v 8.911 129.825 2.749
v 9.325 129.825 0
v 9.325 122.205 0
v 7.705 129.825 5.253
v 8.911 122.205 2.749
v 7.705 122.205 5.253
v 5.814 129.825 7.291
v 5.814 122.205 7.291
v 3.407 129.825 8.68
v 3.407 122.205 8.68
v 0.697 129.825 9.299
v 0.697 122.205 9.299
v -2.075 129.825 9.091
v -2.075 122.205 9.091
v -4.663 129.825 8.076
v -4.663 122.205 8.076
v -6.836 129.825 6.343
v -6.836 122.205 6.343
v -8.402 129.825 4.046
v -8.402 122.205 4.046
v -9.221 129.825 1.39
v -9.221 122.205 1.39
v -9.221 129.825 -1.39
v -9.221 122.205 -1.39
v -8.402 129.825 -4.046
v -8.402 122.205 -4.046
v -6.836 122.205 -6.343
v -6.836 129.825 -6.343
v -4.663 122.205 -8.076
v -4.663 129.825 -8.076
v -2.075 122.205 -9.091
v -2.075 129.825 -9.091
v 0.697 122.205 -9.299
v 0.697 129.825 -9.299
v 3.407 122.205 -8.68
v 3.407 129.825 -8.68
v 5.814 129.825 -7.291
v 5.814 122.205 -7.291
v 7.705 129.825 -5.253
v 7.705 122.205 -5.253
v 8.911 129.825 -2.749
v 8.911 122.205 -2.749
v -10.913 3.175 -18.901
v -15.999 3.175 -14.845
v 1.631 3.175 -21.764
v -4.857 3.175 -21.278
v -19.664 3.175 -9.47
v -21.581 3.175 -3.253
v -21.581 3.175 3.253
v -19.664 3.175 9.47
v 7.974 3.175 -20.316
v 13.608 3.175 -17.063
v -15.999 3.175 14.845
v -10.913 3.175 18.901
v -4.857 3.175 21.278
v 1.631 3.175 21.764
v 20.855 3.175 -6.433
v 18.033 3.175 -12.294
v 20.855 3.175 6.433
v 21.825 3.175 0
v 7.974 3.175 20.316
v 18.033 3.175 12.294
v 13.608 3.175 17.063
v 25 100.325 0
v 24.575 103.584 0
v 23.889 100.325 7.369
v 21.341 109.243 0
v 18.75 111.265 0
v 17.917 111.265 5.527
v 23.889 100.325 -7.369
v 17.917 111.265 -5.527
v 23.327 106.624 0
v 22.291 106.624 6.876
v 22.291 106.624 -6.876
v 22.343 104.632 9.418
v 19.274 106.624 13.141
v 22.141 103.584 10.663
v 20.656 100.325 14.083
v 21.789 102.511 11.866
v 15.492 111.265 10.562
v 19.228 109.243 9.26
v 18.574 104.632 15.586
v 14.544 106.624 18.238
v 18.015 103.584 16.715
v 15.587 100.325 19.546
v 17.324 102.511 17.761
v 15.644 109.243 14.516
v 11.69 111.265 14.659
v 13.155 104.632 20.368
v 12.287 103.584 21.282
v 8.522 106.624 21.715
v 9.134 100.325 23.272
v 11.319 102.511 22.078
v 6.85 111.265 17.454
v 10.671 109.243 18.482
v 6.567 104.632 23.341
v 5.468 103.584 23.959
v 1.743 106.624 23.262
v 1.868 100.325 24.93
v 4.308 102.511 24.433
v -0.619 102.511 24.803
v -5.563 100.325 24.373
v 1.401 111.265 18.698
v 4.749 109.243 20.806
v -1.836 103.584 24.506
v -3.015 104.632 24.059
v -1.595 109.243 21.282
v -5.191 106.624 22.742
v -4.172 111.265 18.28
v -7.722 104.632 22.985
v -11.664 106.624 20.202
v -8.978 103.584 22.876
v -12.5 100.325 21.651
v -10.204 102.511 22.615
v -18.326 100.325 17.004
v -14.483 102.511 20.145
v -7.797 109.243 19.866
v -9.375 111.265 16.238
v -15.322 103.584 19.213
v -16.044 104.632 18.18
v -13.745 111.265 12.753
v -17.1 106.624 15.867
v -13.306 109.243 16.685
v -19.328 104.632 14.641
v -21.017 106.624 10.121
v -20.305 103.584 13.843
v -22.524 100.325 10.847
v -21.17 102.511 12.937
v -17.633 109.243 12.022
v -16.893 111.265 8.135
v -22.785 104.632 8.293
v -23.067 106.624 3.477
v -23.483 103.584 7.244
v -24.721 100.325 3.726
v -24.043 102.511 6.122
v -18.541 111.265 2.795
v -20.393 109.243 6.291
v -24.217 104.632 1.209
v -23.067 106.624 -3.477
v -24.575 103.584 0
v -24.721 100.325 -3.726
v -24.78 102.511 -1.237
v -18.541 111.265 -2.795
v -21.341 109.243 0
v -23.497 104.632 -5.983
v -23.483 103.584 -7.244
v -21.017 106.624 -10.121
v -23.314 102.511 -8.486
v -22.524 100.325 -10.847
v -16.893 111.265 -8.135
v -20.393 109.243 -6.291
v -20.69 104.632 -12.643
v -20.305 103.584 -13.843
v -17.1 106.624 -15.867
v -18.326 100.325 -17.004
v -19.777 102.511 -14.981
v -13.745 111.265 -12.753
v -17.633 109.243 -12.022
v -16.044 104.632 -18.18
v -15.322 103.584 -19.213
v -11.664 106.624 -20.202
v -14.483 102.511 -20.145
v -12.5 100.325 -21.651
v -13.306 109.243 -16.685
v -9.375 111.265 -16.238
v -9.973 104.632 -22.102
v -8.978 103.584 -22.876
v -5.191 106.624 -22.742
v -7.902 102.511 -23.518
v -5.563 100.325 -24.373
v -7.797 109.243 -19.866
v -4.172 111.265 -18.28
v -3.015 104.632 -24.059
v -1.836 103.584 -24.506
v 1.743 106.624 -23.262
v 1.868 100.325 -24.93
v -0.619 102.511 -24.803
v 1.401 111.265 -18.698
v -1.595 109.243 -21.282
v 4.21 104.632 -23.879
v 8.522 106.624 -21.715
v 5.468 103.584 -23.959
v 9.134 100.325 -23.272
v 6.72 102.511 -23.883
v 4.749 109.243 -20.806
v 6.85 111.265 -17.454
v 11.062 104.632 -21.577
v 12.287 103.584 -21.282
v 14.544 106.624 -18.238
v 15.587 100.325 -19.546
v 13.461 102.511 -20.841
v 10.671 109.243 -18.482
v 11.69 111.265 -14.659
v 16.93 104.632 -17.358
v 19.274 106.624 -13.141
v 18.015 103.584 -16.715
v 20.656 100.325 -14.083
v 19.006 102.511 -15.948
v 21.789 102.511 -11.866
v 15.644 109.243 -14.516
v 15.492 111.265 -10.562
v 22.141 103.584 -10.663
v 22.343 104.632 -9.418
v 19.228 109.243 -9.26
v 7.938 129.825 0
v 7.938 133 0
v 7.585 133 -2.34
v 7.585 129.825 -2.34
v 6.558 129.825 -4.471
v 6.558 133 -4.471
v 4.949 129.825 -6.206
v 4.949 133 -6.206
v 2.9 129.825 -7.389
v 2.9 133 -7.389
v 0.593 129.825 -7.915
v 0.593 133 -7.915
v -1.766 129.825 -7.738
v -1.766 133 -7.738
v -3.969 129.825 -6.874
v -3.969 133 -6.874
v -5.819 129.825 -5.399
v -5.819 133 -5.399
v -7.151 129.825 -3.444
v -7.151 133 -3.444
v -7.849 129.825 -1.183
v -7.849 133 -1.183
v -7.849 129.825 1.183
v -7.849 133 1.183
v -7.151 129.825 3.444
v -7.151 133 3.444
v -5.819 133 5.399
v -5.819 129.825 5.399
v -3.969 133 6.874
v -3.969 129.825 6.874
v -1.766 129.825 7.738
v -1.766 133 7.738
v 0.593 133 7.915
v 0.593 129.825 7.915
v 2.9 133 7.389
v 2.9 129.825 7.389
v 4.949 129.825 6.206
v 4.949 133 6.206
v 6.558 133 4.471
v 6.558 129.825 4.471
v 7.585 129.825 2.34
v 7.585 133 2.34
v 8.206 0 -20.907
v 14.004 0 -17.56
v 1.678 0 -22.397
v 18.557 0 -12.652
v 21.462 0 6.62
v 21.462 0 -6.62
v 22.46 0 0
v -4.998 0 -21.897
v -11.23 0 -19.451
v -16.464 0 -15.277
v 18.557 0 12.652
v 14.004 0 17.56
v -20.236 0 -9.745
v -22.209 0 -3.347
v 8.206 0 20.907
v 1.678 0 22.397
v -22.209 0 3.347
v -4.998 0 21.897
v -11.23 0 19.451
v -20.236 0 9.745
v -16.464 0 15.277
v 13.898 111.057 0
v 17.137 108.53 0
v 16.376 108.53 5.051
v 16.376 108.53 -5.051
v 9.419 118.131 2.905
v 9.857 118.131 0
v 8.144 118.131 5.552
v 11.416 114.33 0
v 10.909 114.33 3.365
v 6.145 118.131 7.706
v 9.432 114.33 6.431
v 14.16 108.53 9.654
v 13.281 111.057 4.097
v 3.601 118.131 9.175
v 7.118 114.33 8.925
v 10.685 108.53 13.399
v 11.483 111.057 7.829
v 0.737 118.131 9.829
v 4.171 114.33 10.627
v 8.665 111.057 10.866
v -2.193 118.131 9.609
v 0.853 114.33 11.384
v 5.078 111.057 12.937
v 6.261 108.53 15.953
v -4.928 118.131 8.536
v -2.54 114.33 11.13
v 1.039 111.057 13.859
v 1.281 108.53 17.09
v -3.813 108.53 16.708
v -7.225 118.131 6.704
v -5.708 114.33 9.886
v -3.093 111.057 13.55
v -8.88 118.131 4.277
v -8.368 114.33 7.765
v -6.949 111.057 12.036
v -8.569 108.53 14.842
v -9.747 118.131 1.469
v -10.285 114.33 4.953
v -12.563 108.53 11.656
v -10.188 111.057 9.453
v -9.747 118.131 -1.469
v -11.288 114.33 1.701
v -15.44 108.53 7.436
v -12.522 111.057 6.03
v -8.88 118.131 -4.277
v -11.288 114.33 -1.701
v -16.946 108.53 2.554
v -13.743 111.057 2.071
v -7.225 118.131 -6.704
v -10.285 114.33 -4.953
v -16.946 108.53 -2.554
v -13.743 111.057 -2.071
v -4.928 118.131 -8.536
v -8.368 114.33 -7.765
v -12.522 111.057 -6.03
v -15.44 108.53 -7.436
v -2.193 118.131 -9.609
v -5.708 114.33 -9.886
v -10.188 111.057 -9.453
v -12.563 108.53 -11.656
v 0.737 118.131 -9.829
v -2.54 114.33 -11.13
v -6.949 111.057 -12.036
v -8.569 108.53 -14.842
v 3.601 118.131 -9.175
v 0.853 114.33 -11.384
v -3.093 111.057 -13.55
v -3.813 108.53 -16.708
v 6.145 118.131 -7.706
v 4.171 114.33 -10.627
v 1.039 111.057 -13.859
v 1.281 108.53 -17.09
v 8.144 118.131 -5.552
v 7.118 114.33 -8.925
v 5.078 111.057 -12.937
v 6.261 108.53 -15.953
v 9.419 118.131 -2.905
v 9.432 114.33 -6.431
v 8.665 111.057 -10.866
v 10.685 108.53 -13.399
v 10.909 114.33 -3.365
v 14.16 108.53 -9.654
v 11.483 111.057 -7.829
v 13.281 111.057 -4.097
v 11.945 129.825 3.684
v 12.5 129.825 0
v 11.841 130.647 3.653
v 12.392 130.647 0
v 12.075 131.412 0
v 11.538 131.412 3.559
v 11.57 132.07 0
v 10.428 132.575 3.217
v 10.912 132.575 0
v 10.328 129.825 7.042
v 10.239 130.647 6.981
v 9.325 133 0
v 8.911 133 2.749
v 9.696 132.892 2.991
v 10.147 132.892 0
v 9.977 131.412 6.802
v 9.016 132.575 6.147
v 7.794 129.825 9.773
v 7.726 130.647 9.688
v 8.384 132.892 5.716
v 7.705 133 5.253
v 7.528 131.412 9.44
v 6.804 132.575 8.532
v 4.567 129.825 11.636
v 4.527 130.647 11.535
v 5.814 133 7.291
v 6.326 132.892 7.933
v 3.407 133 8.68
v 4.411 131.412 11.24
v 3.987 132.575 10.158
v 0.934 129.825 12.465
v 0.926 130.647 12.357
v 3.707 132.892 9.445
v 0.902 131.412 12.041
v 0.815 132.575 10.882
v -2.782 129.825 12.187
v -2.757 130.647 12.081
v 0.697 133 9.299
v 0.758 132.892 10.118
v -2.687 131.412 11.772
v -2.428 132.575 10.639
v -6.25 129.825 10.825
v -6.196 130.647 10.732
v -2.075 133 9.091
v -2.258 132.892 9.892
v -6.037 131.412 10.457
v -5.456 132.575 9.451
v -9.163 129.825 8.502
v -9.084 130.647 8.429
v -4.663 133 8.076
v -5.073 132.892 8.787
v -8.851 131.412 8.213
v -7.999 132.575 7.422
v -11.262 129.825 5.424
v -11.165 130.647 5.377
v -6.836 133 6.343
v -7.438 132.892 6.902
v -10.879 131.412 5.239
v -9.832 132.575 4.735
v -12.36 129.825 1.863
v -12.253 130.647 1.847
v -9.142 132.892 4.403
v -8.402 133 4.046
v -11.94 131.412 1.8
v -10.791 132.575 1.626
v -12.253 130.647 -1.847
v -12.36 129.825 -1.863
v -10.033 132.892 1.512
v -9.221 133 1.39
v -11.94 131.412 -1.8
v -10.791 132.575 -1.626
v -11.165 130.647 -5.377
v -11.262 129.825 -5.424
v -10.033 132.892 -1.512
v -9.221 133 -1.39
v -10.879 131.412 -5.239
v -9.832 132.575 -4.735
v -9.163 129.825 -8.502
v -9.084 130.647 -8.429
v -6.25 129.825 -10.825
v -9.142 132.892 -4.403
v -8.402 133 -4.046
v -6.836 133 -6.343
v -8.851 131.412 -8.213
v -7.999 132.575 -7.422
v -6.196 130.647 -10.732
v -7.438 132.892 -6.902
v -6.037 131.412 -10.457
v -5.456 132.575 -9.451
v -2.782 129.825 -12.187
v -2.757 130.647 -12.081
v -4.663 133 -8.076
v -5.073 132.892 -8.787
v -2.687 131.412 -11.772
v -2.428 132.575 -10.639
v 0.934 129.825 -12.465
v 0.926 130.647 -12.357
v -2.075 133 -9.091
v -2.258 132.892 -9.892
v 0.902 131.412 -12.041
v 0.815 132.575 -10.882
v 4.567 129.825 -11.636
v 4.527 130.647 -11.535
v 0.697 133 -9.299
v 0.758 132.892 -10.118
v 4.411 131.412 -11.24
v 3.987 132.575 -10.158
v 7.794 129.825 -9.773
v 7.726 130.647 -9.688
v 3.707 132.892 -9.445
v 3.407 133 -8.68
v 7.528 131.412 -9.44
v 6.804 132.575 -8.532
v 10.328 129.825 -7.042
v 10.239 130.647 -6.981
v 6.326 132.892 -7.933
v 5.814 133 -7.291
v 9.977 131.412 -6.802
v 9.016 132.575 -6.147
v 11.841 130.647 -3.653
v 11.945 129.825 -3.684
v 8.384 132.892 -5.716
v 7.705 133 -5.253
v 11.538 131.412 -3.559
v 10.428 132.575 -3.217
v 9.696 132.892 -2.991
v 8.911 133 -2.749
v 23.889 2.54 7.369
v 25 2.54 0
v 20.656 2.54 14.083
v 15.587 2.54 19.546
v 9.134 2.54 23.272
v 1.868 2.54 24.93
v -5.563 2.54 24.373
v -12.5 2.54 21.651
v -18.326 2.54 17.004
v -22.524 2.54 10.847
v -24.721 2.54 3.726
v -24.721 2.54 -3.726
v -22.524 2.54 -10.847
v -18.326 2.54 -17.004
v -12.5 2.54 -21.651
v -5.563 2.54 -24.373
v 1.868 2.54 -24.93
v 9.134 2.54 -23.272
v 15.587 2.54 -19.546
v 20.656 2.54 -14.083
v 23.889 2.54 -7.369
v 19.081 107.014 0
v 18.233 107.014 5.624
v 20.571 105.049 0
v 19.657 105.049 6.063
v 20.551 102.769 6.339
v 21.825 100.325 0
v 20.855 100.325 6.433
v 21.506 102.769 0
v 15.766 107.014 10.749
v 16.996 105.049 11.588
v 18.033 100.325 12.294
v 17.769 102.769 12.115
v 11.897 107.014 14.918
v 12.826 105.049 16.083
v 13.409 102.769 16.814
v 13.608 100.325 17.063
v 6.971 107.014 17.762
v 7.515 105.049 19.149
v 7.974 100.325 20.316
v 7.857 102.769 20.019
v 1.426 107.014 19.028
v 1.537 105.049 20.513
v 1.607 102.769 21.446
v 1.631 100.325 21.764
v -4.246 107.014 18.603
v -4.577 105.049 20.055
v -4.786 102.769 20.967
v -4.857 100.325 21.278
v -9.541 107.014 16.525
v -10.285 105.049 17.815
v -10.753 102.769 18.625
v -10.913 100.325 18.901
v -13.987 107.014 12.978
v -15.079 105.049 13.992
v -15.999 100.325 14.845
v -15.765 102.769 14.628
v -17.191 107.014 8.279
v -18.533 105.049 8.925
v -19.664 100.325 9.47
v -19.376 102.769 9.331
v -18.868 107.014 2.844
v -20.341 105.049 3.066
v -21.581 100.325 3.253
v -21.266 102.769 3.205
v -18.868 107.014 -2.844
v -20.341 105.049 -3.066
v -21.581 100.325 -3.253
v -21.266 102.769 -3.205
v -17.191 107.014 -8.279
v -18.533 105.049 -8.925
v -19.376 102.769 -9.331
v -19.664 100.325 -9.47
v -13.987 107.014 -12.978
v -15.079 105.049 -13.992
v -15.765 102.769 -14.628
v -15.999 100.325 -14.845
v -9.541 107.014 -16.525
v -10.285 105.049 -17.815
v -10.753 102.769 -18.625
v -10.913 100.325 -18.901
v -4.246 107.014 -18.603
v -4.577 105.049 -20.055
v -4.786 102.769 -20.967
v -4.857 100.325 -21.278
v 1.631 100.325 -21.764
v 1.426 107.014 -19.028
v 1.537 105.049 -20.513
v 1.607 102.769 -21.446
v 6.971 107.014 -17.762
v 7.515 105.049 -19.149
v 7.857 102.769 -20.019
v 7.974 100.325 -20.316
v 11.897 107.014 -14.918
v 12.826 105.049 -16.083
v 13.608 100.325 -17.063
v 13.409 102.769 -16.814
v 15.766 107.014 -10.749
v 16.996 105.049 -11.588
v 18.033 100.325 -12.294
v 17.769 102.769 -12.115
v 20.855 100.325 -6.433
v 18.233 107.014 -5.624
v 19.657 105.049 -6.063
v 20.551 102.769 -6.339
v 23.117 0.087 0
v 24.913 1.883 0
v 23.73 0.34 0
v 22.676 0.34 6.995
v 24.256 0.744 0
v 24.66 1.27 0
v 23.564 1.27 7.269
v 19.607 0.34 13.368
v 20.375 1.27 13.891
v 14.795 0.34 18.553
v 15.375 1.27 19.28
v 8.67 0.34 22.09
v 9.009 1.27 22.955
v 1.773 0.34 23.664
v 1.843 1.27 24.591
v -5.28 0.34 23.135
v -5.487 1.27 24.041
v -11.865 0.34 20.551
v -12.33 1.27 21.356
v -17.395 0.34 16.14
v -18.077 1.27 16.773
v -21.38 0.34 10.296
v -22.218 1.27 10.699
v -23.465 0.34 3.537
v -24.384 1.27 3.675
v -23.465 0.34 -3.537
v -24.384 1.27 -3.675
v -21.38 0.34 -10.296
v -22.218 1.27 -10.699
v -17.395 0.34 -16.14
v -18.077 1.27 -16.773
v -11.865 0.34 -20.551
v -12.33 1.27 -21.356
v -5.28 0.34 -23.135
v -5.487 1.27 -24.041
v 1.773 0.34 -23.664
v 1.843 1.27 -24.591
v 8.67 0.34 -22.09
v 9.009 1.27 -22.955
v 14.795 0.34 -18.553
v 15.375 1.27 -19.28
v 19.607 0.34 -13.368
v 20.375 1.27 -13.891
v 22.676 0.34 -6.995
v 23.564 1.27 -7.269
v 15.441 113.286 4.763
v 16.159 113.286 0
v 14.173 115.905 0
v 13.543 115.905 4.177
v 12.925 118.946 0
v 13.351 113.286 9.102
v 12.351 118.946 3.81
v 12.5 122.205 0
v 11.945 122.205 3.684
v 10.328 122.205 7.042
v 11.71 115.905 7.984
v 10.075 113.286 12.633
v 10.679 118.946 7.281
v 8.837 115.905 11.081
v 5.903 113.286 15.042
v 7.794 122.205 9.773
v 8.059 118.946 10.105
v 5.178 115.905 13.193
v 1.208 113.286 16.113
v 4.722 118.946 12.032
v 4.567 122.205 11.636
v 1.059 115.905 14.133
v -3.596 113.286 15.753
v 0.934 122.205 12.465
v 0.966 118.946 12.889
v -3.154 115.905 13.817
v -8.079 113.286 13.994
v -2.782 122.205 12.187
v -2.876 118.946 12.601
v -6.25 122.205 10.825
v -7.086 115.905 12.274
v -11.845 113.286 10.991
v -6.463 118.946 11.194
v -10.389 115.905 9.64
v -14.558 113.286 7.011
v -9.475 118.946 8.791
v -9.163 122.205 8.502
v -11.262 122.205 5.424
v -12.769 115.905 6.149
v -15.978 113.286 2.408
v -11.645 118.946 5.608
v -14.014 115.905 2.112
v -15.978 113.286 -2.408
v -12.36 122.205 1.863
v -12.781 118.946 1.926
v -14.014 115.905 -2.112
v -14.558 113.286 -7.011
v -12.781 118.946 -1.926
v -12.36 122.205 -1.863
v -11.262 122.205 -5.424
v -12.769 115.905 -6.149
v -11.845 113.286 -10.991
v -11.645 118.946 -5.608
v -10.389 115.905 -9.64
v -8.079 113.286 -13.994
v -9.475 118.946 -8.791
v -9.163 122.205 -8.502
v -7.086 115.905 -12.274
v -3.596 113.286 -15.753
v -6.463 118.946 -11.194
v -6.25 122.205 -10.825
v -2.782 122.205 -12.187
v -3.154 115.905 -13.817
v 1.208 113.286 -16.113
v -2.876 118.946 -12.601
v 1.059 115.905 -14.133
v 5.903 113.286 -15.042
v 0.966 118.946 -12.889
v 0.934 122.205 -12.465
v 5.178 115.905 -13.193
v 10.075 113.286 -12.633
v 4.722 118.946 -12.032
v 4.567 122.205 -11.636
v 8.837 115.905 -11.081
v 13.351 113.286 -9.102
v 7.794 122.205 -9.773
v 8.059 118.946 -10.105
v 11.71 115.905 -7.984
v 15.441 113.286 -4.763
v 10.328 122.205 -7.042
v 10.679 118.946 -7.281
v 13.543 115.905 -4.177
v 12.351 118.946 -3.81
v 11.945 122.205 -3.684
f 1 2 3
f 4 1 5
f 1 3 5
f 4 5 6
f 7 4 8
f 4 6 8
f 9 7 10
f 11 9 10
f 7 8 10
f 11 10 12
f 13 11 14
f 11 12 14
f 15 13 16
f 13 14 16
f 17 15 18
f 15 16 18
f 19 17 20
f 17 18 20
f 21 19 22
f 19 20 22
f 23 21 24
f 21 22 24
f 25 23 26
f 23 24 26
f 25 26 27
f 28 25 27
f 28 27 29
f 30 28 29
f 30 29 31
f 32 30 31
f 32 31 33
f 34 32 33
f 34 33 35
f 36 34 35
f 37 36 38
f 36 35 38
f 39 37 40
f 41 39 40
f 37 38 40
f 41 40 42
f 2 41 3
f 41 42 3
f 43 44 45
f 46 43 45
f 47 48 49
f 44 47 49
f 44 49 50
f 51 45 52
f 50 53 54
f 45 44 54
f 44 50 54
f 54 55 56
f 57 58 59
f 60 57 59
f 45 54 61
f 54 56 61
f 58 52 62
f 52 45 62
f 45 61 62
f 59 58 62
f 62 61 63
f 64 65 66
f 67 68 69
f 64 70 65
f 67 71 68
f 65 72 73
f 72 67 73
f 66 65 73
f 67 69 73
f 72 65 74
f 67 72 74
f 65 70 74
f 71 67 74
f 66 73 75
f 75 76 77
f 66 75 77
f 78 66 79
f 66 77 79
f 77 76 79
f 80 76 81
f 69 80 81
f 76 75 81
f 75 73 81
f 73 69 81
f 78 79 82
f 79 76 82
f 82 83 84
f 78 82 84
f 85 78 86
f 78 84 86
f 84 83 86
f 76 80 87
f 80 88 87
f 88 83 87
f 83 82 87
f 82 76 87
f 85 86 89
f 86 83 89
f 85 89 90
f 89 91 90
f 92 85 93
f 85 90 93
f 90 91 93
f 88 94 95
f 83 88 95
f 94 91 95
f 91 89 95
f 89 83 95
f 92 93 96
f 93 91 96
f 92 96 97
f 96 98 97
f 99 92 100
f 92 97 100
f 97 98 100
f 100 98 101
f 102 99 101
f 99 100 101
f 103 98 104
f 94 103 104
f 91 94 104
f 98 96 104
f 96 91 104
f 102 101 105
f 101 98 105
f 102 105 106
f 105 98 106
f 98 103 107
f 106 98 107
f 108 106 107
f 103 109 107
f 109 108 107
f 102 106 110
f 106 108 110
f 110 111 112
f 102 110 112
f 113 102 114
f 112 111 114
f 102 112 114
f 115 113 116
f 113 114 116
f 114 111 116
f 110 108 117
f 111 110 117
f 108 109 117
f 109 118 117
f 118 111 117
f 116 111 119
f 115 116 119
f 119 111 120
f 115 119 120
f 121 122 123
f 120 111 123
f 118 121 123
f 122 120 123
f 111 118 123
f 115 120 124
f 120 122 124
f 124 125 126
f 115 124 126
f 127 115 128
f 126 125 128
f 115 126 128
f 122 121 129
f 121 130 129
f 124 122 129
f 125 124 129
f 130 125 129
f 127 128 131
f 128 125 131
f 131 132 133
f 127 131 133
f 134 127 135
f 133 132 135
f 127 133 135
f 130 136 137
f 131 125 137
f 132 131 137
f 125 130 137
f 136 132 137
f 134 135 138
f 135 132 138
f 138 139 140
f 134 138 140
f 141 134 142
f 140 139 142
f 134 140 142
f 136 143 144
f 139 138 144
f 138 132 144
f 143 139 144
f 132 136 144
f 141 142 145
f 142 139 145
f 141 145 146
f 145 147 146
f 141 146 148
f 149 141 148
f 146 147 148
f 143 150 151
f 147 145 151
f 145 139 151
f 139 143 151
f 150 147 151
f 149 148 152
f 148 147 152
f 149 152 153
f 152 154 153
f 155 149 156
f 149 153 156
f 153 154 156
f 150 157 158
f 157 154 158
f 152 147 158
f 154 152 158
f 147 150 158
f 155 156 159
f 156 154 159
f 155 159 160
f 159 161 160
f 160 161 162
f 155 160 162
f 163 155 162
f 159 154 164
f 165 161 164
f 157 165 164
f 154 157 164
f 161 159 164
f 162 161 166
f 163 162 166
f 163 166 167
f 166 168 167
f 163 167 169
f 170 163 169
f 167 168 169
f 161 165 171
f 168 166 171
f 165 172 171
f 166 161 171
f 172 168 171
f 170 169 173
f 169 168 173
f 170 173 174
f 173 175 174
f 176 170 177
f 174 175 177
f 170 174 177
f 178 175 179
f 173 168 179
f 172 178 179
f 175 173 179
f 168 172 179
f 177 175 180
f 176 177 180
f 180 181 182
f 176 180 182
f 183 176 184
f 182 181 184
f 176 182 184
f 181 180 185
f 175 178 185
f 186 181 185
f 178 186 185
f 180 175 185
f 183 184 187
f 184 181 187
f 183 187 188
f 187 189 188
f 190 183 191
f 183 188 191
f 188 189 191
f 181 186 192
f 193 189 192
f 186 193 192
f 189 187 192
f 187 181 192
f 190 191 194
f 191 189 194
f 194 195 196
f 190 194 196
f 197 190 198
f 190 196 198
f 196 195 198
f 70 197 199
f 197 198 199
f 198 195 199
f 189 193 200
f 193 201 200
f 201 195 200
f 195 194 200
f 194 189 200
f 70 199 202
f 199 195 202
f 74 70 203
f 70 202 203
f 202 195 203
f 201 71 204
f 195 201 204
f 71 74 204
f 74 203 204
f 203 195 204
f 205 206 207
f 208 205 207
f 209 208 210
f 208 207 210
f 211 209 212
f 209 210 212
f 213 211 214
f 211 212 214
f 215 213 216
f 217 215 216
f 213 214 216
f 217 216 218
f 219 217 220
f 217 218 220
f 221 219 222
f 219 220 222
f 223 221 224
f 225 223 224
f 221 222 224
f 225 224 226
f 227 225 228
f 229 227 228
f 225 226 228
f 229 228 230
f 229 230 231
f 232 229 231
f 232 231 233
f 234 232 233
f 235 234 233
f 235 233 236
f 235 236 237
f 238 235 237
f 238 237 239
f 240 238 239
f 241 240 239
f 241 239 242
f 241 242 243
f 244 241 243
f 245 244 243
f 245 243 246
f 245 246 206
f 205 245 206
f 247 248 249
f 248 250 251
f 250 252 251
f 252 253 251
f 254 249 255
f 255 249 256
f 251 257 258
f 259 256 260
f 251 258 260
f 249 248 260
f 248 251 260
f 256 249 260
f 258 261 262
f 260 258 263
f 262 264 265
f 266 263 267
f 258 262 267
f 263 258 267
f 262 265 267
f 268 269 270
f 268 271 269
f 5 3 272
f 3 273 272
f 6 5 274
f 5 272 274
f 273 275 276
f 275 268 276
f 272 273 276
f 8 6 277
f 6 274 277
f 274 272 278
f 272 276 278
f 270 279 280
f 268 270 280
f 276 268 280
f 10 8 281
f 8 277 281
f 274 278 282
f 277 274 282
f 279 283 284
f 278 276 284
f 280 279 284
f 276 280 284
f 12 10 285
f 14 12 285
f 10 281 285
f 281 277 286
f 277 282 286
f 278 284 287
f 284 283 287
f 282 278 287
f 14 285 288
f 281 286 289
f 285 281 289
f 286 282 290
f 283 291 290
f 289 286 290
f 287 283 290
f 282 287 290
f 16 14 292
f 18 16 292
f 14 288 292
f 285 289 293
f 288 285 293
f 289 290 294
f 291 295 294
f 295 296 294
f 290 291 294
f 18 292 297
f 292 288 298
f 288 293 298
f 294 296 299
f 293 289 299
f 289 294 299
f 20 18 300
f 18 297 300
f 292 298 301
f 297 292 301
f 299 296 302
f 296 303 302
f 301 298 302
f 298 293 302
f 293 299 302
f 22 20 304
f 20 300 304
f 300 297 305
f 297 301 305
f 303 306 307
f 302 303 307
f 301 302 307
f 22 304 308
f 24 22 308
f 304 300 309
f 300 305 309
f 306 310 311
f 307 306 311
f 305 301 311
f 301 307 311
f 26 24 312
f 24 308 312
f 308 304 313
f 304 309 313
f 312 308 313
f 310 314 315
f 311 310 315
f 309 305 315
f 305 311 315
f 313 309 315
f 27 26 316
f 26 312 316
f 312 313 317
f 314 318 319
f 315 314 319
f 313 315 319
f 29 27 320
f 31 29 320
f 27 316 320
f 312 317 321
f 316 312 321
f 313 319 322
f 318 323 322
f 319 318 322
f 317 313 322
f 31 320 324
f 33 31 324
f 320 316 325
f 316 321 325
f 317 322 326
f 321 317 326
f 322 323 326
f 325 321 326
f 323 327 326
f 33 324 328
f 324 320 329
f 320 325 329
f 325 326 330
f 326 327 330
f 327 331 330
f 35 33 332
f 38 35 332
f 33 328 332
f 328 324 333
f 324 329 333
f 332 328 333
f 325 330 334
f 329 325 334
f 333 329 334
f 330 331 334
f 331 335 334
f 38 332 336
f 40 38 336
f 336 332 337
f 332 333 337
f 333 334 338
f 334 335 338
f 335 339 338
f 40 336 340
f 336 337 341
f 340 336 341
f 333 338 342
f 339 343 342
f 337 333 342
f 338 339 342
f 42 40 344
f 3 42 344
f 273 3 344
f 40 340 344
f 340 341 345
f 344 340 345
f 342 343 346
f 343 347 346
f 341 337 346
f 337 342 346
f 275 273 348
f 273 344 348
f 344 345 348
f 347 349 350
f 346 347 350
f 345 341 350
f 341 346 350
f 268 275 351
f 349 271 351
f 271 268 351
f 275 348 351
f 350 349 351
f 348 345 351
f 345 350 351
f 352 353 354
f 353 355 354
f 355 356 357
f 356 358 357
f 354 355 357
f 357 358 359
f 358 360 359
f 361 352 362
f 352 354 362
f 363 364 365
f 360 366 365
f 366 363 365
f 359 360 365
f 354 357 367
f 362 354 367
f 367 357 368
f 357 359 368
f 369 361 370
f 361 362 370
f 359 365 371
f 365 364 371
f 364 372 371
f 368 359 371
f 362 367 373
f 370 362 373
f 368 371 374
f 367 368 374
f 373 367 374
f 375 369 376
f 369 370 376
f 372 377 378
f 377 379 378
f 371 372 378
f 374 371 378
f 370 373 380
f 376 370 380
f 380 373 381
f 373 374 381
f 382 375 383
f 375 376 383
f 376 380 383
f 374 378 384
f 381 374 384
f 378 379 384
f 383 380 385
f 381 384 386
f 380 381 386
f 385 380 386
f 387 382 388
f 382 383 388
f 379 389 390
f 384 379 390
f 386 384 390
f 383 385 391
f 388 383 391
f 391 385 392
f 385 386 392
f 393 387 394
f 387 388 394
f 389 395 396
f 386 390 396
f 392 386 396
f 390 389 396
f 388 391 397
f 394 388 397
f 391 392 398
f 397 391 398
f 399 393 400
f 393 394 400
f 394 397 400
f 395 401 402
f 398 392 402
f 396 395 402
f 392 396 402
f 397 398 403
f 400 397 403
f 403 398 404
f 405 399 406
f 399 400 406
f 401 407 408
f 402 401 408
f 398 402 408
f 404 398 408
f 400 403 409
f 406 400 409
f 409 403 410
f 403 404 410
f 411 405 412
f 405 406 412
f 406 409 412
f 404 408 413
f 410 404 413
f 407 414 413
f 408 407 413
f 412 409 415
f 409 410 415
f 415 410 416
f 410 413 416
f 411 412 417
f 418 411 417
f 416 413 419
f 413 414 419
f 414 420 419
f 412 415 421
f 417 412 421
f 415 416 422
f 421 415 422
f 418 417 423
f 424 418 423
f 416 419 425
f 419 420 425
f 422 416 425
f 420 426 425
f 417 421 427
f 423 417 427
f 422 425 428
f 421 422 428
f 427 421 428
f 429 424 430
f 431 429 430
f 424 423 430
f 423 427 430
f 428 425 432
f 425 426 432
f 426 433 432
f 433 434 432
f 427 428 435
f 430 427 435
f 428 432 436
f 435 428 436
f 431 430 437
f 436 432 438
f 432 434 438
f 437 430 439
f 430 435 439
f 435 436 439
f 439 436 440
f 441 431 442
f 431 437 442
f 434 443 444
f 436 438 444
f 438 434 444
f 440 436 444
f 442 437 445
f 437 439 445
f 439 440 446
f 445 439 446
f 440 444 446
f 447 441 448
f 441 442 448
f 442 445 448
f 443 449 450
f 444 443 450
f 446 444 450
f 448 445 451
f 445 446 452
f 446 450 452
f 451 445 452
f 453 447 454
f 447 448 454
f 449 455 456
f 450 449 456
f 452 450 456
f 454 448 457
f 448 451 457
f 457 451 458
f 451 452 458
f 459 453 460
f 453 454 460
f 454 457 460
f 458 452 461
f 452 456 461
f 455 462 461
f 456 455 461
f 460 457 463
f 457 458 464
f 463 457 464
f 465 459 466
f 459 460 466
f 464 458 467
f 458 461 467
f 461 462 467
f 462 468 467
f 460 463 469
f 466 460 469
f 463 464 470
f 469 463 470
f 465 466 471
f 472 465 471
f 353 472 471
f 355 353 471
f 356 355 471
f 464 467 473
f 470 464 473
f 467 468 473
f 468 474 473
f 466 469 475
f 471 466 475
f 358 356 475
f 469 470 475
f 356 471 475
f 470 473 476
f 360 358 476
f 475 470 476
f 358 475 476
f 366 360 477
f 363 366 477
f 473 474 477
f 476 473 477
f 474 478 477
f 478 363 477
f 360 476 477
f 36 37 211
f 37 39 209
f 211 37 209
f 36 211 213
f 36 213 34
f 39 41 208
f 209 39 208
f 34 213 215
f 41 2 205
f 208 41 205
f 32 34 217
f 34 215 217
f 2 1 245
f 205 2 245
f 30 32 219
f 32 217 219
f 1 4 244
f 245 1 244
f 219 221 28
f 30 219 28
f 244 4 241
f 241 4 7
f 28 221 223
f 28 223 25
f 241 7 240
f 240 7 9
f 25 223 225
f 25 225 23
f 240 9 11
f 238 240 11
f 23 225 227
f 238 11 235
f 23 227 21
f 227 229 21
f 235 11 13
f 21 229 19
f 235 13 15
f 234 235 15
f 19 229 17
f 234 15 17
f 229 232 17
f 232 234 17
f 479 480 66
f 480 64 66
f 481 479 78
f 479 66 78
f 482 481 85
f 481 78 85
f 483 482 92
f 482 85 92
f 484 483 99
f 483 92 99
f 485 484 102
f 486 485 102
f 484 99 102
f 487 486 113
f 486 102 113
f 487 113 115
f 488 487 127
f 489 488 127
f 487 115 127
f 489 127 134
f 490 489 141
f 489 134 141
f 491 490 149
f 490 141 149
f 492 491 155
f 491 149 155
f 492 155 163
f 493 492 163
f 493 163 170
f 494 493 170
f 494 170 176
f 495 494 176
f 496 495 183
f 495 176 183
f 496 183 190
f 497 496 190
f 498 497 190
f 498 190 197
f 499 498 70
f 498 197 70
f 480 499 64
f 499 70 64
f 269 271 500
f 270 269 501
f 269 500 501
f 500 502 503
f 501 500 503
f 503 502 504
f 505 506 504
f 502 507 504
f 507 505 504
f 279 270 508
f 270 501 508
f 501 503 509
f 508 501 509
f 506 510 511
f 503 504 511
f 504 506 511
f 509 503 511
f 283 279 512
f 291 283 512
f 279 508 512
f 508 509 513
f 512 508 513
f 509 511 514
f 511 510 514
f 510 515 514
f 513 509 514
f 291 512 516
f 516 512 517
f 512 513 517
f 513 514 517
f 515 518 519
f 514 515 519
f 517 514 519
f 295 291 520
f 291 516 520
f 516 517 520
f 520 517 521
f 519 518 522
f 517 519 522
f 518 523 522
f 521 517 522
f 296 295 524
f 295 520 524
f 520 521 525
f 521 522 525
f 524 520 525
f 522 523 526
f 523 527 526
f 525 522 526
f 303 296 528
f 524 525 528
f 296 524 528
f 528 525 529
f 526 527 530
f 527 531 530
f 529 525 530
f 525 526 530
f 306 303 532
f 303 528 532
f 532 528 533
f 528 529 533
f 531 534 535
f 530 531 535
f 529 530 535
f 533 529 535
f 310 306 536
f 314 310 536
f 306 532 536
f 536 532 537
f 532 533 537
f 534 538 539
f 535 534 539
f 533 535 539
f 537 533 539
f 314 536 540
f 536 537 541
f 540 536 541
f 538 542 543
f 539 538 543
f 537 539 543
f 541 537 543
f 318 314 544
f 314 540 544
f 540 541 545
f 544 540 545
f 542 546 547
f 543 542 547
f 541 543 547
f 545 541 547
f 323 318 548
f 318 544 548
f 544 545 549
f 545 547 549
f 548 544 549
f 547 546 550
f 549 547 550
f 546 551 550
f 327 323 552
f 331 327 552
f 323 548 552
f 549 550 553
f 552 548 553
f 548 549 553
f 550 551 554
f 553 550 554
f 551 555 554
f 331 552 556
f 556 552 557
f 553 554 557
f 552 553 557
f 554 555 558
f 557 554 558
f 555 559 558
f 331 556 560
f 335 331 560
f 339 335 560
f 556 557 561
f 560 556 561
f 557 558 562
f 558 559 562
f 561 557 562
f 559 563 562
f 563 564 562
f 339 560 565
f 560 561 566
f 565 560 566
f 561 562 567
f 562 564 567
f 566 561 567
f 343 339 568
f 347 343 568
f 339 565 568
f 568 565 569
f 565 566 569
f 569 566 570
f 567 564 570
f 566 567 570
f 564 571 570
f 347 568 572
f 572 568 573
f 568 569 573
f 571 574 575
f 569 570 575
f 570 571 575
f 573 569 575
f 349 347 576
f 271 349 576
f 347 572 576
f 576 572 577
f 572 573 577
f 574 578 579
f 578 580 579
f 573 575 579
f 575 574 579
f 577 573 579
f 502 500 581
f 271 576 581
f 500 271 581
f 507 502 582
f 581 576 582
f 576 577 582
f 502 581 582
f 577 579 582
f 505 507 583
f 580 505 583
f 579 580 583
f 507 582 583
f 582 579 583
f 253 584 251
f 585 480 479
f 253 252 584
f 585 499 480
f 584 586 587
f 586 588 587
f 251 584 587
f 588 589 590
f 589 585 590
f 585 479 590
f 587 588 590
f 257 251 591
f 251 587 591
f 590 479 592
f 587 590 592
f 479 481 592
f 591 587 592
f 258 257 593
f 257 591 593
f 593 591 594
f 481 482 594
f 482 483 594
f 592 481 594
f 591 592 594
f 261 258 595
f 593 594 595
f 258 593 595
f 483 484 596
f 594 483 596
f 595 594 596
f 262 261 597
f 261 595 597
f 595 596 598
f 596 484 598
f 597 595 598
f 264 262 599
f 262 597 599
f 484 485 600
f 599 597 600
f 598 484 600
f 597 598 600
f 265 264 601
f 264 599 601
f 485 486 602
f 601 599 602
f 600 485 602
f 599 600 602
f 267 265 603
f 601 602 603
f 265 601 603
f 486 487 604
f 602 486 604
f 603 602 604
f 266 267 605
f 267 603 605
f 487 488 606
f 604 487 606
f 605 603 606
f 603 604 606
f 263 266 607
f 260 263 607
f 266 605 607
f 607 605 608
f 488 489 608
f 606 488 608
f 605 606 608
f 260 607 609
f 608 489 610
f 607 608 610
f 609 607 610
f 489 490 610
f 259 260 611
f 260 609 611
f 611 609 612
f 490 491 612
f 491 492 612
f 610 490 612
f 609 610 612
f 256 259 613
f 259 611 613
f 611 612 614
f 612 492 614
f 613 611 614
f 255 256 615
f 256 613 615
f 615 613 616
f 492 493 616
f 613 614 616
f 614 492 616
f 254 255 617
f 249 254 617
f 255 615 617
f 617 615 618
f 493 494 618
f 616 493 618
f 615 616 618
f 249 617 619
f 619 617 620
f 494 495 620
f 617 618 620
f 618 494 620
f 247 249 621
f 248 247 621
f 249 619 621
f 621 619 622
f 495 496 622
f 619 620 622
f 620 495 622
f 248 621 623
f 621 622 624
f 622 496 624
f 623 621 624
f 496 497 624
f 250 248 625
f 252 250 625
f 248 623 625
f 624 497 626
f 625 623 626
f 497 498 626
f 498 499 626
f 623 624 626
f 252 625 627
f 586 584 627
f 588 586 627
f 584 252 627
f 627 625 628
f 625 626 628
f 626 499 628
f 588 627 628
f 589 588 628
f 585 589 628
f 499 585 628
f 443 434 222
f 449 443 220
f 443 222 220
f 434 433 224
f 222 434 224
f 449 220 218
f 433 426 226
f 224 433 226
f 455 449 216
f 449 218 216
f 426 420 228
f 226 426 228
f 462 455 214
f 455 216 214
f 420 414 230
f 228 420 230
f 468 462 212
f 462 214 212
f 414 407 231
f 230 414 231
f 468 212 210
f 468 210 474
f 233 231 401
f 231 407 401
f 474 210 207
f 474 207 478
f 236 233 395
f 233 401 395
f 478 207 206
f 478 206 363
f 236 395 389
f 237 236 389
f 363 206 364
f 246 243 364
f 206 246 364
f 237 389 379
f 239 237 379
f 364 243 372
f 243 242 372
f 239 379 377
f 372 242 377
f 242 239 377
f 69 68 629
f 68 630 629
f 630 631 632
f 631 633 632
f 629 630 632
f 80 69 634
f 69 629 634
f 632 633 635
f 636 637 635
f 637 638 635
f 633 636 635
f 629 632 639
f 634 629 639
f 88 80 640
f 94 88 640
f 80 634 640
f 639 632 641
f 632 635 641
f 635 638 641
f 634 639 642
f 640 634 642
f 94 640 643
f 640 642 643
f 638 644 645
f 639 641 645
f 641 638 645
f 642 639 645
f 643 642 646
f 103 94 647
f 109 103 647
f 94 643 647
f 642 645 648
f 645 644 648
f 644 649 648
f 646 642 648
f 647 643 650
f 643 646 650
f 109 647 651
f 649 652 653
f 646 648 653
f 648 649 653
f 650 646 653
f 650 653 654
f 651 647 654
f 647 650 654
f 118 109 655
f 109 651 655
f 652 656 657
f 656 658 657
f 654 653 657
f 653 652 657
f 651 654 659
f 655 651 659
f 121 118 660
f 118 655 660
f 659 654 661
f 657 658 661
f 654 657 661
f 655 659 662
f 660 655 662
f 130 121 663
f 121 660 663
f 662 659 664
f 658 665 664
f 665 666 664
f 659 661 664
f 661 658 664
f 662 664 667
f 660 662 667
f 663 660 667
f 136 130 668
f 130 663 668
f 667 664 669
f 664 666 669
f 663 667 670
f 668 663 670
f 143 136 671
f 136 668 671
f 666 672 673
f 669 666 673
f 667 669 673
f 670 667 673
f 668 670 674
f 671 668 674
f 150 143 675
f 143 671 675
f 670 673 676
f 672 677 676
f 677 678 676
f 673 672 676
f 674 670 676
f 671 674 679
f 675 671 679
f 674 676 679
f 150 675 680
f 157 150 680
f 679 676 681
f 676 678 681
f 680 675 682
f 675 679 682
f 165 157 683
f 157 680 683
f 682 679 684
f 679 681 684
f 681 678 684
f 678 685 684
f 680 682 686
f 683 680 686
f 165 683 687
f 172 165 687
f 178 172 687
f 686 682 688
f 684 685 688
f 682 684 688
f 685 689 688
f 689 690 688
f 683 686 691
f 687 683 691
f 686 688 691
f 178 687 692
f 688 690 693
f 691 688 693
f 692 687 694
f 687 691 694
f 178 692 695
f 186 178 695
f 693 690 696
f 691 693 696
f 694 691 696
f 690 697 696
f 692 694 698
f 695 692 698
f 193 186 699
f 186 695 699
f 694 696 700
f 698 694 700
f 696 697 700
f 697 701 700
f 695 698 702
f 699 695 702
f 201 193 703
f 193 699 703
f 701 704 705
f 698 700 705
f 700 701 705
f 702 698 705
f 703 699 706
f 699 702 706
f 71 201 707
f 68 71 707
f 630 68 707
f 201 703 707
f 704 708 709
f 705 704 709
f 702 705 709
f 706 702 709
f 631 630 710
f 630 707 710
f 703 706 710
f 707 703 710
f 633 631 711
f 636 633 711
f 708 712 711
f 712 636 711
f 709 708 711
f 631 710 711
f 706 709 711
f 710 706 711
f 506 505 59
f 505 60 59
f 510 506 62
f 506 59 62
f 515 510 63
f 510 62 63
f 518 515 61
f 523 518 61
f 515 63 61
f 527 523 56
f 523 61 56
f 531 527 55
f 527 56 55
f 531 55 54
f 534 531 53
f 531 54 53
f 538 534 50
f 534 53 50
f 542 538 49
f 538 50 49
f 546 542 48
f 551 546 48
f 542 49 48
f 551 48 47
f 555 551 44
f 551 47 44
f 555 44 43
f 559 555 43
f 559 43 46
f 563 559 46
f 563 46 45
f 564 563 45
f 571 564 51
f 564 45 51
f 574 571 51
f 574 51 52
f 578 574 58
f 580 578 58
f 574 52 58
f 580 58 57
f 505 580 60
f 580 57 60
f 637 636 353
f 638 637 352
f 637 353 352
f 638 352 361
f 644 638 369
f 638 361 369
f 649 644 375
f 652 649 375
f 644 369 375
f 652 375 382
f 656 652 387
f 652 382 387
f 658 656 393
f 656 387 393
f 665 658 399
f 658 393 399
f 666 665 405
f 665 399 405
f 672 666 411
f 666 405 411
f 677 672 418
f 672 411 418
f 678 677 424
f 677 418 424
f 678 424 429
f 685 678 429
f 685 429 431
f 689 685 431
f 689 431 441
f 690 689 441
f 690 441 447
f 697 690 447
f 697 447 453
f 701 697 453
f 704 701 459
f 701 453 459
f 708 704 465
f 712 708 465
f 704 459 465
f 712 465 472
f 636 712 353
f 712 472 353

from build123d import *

# Parameters (mm, degrees)
SKETCH2_R          = 7.9375
CUT_EXTRUDE1_DEPTH = 12.7


with BuildPart() as part:
    # Sketch1 → Revolve-Thin2 (revolve)
    with BuildSketch(Plane.XY):
        with BuildLine():
            Line((0, 0), (22.46, 0))
            ThreePointArc((22.46, 0), (24.256051224, 0.743948776), (25, 2.54))
            Line((25, 2.54), (25, 100.324643513))
            ThreePointArc((25, 100.324643513), (23.327352357, 106.624445097), (18.75, 111.264821756))
            ThreePointArc((18.75, 111.264821756), (14.172647643, 115.905198416), (12.5, 122.205))
            Line((12.5, 122.205), (12.5, 129.825))
            ThreePointArc((12.5, 129.825), (11.57006403, 132.07006403), (9.325, 133))
            Line((9.325, 133), (0, 133))
            Line((0, 133), (0, 129.825))
            Line((0, 129.825), (9.325, 129.825))
            Line((9.325, 129.825), (9.325, 122.205))
            ThreePointArc((9.325, 122.205), (11.415809554, 114.33024802), (17.1375, 108.529777196))
            ThreePointArc((17.1375, 108.529777196), (20.570514268, 105.049494701), (21.825, 100.324643513))
            Line((21.825, 100.324643513), (21.825, 3.175))
            Line((21.825, 3.175), (0, 3.175))
            Line((0, 3.175), (0, 0))
        make_face()
    revolve(axis=Axis((0, 133, 0), (0, -1, 0)))

    # Sketch2 → Cut-Extrude1 (cut)
    with BuildSketch(Plane(origin=(0, 133, 0), x_dir=(1, 0, 0), z_dir=(0, 1, 0))):
        Circle(SKETCH2_R)
    extrude(amount=-CUT_EXTRUDE1_DEPTH, mode=Mode.SUBTRACT)


solid = part.part
